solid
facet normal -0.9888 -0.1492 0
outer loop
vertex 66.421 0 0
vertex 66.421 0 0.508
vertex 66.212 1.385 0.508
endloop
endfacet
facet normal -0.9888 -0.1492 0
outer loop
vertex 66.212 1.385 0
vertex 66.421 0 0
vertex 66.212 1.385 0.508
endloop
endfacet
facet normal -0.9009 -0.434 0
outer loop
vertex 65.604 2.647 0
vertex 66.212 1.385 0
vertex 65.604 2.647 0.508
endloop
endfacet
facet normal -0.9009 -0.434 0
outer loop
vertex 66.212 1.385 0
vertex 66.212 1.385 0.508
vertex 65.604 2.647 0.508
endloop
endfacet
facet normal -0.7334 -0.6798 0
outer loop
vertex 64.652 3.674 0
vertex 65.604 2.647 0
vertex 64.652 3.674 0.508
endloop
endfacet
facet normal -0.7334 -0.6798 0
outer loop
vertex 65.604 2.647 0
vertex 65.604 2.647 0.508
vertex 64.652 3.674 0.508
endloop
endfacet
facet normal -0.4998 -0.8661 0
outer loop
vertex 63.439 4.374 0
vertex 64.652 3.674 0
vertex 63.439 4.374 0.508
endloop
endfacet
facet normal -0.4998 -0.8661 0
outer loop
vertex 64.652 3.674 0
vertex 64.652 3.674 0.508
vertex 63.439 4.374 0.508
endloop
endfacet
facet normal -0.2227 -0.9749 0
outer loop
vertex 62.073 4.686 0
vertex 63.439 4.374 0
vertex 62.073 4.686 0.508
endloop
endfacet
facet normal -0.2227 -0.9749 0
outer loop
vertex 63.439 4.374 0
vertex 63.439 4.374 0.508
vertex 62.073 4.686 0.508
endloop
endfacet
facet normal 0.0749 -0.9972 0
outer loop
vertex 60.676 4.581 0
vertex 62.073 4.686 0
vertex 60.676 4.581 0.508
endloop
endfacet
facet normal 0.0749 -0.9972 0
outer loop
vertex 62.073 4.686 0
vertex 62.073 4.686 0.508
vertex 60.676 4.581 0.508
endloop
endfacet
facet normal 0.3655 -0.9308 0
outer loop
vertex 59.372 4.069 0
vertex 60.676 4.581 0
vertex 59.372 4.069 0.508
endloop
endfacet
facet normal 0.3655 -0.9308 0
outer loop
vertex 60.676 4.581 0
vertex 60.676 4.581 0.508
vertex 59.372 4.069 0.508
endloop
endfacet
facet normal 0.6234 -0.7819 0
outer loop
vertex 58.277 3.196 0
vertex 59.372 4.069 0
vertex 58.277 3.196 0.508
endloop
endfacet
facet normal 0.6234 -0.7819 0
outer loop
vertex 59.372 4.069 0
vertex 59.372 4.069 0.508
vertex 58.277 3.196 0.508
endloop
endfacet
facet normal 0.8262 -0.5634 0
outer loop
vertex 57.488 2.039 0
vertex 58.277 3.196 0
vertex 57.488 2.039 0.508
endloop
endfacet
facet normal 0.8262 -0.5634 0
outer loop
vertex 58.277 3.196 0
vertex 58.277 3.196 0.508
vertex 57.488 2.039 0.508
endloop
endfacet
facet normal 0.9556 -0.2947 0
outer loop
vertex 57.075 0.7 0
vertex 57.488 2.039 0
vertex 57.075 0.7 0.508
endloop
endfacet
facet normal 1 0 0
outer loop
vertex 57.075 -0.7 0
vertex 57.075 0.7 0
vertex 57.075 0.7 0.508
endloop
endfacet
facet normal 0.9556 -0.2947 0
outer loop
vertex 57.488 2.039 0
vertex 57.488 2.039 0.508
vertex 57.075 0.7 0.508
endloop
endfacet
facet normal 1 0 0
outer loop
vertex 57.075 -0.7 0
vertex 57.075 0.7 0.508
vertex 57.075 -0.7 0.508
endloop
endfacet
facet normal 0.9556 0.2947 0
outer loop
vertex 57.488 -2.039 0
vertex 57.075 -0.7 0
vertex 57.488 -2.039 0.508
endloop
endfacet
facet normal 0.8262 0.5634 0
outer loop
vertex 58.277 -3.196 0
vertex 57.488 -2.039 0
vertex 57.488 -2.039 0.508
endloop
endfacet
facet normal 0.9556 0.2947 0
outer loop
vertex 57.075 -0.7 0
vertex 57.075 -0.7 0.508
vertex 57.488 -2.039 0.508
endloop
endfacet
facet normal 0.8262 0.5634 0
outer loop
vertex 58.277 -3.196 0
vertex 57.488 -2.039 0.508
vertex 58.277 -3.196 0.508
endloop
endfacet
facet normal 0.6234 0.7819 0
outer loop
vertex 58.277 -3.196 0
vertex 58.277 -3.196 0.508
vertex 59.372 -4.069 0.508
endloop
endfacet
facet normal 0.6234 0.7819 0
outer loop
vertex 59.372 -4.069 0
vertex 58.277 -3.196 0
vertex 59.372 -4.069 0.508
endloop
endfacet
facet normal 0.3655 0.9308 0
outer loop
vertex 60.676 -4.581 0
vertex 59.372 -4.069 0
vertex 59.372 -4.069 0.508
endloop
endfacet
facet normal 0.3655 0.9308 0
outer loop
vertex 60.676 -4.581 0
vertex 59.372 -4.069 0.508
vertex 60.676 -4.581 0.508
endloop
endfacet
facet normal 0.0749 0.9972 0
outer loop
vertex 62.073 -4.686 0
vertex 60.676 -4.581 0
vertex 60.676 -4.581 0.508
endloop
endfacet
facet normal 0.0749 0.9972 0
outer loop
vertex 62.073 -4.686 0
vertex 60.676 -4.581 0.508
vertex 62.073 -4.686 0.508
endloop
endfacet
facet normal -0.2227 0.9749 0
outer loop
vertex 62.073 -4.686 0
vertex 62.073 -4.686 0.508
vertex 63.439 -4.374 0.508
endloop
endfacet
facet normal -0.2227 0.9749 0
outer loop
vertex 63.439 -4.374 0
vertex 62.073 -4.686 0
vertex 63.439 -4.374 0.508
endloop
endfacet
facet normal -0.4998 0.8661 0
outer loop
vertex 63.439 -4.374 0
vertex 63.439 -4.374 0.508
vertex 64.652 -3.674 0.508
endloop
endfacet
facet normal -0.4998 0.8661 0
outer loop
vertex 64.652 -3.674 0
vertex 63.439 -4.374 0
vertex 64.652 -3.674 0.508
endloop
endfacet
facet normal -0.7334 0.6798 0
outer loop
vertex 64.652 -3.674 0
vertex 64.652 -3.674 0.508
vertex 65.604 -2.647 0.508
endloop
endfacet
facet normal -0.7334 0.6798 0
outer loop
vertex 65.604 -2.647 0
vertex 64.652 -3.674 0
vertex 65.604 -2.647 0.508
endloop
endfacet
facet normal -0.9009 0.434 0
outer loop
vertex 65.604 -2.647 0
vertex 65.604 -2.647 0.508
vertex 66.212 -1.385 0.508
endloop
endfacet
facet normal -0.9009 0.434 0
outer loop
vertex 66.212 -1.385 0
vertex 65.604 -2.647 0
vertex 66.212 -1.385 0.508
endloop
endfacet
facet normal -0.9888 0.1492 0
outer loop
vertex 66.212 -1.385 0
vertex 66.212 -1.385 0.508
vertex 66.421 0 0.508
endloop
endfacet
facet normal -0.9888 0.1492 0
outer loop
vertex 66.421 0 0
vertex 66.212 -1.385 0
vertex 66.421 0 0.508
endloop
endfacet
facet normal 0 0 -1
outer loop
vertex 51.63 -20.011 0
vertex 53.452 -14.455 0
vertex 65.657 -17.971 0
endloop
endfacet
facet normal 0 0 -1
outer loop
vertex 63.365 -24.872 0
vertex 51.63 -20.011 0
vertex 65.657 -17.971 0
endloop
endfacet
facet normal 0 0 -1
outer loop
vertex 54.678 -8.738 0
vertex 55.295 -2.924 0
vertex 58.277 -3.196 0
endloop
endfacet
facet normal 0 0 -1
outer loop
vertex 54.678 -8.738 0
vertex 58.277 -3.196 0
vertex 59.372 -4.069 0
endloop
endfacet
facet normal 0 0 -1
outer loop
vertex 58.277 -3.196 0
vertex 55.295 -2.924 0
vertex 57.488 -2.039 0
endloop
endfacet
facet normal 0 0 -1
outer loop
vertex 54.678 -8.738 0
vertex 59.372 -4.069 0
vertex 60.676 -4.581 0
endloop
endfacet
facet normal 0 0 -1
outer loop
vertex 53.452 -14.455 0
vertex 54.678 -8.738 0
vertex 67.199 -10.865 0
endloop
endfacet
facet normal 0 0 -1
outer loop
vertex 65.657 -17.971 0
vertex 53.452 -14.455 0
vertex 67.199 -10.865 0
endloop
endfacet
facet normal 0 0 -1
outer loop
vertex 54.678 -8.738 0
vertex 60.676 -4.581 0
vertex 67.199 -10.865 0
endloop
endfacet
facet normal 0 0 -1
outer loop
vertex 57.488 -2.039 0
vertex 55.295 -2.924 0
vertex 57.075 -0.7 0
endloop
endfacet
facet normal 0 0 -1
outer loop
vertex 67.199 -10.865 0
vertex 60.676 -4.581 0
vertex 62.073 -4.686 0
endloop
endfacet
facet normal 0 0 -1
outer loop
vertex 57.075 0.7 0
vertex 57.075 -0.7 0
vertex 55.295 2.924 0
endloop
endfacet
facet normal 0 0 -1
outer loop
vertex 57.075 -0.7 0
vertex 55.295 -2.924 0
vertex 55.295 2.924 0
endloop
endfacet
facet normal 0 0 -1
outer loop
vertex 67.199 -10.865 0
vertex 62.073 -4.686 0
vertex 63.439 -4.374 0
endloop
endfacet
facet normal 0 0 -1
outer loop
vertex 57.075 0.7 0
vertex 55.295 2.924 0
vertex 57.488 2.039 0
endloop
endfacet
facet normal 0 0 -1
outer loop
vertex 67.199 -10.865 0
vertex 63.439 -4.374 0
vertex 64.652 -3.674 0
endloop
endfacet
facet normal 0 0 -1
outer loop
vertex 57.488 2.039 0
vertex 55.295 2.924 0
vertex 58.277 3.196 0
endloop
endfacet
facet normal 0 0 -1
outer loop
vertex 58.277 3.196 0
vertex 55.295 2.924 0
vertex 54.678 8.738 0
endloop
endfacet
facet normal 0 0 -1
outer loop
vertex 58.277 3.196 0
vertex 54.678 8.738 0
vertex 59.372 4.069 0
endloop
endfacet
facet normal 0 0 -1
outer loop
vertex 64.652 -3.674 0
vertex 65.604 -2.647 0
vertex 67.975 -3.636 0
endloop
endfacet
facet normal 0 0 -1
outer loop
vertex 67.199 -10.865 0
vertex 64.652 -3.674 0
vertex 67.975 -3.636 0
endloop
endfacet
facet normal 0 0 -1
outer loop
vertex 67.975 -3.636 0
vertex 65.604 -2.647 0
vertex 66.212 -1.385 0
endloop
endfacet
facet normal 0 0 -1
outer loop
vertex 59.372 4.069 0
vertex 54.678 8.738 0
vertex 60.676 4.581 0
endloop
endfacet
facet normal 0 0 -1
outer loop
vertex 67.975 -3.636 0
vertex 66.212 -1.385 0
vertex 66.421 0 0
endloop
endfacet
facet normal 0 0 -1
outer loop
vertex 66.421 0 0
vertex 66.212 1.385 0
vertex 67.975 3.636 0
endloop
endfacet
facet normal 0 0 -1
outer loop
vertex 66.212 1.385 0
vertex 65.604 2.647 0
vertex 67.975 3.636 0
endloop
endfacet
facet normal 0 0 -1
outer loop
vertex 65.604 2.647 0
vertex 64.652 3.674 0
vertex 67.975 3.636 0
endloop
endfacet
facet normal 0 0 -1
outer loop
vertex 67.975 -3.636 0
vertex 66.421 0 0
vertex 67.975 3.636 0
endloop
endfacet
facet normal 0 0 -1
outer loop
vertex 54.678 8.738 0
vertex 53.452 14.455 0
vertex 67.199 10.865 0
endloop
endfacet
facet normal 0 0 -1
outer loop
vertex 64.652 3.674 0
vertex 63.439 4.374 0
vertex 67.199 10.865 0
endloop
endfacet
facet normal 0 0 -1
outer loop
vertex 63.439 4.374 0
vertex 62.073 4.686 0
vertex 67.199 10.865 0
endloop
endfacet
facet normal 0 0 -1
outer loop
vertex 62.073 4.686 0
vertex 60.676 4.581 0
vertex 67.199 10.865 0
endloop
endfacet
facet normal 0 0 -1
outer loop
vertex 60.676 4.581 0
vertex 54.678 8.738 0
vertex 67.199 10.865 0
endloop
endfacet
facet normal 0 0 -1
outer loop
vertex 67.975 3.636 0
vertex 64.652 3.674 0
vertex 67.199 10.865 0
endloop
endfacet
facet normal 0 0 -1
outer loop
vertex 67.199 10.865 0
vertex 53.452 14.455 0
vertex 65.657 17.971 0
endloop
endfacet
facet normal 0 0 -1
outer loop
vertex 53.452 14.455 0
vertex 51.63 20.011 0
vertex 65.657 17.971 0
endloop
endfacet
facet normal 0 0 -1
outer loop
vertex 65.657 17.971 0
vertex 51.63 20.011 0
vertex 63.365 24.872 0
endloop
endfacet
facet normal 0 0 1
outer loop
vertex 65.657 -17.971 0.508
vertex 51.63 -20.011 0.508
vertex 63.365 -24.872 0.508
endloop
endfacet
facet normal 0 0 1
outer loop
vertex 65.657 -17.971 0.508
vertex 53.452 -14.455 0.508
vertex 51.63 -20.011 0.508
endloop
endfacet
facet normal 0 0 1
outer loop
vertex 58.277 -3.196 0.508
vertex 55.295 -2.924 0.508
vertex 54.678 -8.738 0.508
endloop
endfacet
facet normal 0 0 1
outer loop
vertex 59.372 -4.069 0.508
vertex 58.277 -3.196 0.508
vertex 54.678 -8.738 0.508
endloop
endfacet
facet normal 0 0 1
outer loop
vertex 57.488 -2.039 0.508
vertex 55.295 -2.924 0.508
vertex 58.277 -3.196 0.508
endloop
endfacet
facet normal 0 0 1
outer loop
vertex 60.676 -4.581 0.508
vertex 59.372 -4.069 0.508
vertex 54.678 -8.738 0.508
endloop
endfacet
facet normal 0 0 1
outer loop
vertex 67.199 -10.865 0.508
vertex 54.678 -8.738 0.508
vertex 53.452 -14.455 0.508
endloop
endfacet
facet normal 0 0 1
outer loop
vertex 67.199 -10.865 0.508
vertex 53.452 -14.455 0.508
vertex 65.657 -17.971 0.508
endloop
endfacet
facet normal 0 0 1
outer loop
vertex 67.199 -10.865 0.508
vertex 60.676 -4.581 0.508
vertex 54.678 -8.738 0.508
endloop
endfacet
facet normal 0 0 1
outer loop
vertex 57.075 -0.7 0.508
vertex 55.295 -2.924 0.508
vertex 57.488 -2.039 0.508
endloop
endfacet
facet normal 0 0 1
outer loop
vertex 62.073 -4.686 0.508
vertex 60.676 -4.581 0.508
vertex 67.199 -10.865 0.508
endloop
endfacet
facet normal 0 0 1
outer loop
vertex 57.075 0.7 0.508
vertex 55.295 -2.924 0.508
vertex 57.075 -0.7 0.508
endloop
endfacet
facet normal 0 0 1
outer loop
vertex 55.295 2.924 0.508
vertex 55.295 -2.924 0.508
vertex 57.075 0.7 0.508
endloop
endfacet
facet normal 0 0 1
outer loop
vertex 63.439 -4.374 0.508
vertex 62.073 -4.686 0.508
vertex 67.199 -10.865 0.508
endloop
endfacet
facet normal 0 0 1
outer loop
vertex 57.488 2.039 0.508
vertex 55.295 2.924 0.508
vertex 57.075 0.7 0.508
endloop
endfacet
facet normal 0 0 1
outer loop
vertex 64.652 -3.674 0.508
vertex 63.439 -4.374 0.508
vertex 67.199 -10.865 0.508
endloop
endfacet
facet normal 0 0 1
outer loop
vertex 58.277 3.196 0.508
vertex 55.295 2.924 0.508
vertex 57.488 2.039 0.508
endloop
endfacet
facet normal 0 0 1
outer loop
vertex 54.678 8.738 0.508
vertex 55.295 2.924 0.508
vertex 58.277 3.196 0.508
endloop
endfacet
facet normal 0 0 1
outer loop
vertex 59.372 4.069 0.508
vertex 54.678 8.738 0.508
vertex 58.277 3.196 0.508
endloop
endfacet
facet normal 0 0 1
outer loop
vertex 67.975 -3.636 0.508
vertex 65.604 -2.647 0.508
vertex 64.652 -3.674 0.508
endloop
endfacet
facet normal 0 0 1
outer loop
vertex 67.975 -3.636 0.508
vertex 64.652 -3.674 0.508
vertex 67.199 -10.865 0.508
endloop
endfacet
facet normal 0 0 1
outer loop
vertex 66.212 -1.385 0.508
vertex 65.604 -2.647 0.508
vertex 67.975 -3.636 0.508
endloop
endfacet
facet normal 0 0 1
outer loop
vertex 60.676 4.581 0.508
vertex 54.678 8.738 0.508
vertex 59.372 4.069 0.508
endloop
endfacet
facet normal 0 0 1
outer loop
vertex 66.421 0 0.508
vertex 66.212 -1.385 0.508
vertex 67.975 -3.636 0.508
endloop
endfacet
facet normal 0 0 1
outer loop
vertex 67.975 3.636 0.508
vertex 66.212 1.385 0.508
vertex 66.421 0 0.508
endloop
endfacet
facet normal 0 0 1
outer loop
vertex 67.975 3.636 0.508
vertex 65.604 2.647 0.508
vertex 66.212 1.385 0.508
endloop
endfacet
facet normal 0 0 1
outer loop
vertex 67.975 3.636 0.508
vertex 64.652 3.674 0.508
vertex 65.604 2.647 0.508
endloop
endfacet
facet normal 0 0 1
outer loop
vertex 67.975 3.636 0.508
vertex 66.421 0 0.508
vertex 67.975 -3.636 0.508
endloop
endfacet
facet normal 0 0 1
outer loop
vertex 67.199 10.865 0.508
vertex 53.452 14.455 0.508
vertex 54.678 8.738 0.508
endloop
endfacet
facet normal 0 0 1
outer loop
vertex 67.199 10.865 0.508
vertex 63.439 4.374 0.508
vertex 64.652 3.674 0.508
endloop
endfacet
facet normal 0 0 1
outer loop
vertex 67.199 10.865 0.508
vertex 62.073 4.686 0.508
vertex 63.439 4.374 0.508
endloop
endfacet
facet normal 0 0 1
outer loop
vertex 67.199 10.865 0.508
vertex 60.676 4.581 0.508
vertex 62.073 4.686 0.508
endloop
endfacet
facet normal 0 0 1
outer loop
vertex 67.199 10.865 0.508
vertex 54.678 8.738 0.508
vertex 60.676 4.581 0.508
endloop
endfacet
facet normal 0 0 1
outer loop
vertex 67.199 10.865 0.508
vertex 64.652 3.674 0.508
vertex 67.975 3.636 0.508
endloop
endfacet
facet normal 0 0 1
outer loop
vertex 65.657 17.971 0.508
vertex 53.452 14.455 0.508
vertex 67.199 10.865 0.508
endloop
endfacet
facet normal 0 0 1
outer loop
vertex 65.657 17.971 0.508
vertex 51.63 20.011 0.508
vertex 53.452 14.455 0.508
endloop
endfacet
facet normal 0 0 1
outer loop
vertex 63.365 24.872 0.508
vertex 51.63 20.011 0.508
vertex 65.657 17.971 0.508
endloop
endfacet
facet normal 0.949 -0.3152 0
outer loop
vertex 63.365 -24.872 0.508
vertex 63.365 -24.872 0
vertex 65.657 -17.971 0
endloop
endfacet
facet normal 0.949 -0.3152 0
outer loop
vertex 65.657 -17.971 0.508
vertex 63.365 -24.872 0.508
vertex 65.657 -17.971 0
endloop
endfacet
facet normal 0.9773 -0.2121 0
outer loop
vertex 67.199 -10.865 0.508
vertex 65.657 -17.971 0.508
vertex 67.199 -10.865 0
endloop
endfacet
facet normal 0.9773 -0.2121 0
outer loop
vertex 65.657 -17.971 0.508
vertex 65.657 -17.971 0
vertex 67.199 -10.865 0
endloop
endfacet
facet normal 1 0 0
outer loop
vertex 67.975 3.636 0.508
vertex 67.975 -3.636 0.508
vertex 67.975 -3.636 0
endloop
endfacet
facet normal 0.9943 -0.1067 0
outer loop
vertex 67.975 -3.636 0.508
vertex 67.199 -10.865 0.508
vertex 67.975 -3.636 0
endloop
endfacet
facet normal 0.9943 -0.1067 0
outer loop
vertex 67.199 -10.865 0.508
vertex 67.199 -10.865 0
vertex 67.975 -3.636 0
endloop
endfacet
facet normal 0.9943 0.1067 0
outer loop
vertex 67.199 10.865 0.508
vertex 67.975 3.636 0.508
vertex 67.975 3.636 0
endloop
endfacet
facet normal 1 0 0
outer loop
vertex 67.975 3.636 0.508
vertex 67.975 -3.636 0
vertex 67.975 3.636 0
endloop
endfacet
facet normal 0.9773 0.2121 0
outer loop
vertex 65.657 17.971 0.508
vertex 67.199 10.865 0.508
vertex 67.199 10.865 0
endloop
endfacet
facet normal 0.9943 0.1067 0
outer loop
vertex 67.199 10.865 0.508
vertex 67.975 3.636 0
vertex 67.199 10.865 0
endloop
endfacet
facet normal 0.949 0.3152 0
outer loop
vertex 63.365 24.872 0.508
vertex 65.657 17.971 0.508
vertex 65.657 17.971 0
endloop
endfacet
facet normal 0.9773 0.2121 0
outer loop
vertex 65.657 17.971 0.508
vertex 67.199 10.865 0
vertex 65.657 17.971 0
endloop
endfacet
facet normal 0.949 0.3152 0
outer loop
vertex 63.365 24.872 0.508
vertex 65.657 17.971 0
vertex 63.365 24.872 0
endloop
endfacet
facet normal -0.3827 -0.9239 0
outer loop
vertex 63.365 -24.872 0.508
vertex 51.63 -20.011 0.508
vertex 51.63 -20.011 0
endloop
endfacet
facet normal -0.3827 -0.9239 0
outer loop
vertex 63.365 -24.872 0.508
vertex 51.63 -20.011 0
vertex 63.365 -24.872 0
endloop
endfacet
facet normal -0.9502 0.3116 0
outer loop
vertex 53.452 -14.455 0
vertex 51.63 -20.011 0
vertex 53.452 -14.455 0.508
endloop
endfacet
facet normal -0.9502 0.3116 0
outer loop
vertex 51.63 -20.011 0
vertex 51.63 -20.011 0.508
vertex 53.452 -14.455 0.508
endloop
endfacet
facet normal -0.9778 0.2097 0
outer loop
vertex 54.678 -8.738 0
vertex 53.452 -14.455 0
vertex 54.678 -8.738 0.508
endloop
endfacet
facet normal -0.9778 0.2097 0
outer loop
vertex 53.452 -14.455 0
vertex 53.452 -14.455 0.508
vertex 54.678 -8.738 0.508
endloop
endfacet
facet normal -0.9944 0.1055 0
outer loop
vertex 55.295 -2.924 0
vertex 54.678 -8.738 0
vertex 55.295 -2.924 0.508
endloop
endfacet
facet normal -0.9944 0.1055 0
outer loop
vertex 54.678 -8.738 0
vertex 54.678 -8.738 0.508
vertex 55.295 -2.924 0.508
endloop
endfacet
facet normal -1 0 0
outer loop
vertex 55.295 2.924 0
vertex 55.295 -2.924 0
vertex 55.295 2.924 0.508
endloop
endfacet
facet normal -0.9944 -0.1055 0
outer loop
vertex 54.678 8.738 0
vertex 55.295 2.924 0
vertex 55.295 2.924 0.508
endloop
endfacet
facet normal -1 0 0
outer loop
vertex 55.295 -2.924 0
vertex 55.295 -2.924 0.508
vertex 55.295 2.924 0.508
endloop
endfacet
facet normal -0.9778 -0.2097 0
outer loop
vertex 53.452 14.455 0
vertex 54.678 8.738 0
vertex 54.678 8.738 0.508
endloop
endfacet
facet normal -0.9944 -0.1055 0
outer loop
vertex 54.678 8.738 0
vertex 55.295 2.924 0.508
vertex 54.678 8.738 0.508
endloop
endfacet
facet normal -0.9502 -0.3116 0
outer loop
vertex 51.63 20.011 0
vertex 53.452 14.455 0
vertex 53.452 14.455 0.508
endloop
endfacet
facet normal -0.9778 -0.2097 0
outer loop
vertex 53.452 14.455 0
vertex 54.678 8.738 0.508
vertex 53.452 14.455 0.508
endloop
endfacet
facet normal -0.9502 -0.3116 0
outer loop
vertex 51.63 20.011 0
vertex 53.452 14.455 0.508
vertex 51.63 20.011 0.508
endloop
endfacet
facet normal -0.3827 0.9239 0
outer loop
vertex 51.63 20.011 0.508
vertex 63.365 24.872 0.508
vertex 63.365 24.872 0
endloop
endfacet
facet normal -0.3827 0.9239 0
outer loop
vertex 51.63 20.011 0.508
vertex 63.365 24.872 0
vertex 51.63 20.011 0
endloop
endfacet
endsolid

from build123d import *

# Parameters (mm, degrees)
SKETCH4_R           = 68.072
BOSS_EXTRUDE2_DEPTH = 0.508
SKETCH5_R           = 55.372
CUT_EXTRUDE5_DEPTH  = 1.508
SKETCH6_R           = 4.699
CUT_EXTRUDE6_DEPTH  = 1.508
SKETCH8_OUTSIDE_W   = 176.652
SKETCH8_OUTSIDE_H   = 176.652
CUT_EXTRUDE11_DEPTH = 1.508


with BuildPart() as part:
    # Sketch4 → Boss-Extrude2 (new body)
    with BuildSketch(Plane.XY):
        Circle(SKETCH4_R)
    extrude(amount=BOSS_EXTRUDE2_DEPTH)

    # Sketch5 → Cut-Extrude5 (cut, through all)
    with BuildSketch(Plane.XY.offset(0.508)):
        Circle(SKETCH5_R)
    extrude(amount=-CUT_EXTRUDE5_DEPTH, mode=Mode.SUBTRACT)

    # Sketch6 → Cut-Extrude6 (cut, through all)
    with BuildSketch(Plane.XY.offset(0.508)):
        with Locations((61.722, 0)):
            Circle(SKETCH6_R)
    extrude(amount=-CUT_EXTRUDE6_DEPTH, mode=Mode.SUBTRACT)

    # Sketch8 outside → Cut-Extrude11 (cut, through all)
    with BuildSketch(Plane.XY.offset(0.508)):
        Rectangle(SKETCH8_OUTSIDE_W, SKETCH8_OUTSIDE_H)
        with BuildLine():
            Line((51.629608078, -20.011045792), (63.365389329, -24.872165551))
            ThreePointArc((63.365389329, -24.872165551), (68.072, 0), (63.365389329, 24.872165551))
            Line((63.365389329, 24.872165551), (51.629608078, 20.011045792))
            ThreePointArc((51.629608078, 20.011045792), (55.372, 0), (51.629608078, -20.011045792))
        make_face(mode=Mode.SUBTRACT)
    extrude(amount=-CUT_EXTRUDE11_DEPTH, mode=Mode.SUBTRACT)


solid = part.part
